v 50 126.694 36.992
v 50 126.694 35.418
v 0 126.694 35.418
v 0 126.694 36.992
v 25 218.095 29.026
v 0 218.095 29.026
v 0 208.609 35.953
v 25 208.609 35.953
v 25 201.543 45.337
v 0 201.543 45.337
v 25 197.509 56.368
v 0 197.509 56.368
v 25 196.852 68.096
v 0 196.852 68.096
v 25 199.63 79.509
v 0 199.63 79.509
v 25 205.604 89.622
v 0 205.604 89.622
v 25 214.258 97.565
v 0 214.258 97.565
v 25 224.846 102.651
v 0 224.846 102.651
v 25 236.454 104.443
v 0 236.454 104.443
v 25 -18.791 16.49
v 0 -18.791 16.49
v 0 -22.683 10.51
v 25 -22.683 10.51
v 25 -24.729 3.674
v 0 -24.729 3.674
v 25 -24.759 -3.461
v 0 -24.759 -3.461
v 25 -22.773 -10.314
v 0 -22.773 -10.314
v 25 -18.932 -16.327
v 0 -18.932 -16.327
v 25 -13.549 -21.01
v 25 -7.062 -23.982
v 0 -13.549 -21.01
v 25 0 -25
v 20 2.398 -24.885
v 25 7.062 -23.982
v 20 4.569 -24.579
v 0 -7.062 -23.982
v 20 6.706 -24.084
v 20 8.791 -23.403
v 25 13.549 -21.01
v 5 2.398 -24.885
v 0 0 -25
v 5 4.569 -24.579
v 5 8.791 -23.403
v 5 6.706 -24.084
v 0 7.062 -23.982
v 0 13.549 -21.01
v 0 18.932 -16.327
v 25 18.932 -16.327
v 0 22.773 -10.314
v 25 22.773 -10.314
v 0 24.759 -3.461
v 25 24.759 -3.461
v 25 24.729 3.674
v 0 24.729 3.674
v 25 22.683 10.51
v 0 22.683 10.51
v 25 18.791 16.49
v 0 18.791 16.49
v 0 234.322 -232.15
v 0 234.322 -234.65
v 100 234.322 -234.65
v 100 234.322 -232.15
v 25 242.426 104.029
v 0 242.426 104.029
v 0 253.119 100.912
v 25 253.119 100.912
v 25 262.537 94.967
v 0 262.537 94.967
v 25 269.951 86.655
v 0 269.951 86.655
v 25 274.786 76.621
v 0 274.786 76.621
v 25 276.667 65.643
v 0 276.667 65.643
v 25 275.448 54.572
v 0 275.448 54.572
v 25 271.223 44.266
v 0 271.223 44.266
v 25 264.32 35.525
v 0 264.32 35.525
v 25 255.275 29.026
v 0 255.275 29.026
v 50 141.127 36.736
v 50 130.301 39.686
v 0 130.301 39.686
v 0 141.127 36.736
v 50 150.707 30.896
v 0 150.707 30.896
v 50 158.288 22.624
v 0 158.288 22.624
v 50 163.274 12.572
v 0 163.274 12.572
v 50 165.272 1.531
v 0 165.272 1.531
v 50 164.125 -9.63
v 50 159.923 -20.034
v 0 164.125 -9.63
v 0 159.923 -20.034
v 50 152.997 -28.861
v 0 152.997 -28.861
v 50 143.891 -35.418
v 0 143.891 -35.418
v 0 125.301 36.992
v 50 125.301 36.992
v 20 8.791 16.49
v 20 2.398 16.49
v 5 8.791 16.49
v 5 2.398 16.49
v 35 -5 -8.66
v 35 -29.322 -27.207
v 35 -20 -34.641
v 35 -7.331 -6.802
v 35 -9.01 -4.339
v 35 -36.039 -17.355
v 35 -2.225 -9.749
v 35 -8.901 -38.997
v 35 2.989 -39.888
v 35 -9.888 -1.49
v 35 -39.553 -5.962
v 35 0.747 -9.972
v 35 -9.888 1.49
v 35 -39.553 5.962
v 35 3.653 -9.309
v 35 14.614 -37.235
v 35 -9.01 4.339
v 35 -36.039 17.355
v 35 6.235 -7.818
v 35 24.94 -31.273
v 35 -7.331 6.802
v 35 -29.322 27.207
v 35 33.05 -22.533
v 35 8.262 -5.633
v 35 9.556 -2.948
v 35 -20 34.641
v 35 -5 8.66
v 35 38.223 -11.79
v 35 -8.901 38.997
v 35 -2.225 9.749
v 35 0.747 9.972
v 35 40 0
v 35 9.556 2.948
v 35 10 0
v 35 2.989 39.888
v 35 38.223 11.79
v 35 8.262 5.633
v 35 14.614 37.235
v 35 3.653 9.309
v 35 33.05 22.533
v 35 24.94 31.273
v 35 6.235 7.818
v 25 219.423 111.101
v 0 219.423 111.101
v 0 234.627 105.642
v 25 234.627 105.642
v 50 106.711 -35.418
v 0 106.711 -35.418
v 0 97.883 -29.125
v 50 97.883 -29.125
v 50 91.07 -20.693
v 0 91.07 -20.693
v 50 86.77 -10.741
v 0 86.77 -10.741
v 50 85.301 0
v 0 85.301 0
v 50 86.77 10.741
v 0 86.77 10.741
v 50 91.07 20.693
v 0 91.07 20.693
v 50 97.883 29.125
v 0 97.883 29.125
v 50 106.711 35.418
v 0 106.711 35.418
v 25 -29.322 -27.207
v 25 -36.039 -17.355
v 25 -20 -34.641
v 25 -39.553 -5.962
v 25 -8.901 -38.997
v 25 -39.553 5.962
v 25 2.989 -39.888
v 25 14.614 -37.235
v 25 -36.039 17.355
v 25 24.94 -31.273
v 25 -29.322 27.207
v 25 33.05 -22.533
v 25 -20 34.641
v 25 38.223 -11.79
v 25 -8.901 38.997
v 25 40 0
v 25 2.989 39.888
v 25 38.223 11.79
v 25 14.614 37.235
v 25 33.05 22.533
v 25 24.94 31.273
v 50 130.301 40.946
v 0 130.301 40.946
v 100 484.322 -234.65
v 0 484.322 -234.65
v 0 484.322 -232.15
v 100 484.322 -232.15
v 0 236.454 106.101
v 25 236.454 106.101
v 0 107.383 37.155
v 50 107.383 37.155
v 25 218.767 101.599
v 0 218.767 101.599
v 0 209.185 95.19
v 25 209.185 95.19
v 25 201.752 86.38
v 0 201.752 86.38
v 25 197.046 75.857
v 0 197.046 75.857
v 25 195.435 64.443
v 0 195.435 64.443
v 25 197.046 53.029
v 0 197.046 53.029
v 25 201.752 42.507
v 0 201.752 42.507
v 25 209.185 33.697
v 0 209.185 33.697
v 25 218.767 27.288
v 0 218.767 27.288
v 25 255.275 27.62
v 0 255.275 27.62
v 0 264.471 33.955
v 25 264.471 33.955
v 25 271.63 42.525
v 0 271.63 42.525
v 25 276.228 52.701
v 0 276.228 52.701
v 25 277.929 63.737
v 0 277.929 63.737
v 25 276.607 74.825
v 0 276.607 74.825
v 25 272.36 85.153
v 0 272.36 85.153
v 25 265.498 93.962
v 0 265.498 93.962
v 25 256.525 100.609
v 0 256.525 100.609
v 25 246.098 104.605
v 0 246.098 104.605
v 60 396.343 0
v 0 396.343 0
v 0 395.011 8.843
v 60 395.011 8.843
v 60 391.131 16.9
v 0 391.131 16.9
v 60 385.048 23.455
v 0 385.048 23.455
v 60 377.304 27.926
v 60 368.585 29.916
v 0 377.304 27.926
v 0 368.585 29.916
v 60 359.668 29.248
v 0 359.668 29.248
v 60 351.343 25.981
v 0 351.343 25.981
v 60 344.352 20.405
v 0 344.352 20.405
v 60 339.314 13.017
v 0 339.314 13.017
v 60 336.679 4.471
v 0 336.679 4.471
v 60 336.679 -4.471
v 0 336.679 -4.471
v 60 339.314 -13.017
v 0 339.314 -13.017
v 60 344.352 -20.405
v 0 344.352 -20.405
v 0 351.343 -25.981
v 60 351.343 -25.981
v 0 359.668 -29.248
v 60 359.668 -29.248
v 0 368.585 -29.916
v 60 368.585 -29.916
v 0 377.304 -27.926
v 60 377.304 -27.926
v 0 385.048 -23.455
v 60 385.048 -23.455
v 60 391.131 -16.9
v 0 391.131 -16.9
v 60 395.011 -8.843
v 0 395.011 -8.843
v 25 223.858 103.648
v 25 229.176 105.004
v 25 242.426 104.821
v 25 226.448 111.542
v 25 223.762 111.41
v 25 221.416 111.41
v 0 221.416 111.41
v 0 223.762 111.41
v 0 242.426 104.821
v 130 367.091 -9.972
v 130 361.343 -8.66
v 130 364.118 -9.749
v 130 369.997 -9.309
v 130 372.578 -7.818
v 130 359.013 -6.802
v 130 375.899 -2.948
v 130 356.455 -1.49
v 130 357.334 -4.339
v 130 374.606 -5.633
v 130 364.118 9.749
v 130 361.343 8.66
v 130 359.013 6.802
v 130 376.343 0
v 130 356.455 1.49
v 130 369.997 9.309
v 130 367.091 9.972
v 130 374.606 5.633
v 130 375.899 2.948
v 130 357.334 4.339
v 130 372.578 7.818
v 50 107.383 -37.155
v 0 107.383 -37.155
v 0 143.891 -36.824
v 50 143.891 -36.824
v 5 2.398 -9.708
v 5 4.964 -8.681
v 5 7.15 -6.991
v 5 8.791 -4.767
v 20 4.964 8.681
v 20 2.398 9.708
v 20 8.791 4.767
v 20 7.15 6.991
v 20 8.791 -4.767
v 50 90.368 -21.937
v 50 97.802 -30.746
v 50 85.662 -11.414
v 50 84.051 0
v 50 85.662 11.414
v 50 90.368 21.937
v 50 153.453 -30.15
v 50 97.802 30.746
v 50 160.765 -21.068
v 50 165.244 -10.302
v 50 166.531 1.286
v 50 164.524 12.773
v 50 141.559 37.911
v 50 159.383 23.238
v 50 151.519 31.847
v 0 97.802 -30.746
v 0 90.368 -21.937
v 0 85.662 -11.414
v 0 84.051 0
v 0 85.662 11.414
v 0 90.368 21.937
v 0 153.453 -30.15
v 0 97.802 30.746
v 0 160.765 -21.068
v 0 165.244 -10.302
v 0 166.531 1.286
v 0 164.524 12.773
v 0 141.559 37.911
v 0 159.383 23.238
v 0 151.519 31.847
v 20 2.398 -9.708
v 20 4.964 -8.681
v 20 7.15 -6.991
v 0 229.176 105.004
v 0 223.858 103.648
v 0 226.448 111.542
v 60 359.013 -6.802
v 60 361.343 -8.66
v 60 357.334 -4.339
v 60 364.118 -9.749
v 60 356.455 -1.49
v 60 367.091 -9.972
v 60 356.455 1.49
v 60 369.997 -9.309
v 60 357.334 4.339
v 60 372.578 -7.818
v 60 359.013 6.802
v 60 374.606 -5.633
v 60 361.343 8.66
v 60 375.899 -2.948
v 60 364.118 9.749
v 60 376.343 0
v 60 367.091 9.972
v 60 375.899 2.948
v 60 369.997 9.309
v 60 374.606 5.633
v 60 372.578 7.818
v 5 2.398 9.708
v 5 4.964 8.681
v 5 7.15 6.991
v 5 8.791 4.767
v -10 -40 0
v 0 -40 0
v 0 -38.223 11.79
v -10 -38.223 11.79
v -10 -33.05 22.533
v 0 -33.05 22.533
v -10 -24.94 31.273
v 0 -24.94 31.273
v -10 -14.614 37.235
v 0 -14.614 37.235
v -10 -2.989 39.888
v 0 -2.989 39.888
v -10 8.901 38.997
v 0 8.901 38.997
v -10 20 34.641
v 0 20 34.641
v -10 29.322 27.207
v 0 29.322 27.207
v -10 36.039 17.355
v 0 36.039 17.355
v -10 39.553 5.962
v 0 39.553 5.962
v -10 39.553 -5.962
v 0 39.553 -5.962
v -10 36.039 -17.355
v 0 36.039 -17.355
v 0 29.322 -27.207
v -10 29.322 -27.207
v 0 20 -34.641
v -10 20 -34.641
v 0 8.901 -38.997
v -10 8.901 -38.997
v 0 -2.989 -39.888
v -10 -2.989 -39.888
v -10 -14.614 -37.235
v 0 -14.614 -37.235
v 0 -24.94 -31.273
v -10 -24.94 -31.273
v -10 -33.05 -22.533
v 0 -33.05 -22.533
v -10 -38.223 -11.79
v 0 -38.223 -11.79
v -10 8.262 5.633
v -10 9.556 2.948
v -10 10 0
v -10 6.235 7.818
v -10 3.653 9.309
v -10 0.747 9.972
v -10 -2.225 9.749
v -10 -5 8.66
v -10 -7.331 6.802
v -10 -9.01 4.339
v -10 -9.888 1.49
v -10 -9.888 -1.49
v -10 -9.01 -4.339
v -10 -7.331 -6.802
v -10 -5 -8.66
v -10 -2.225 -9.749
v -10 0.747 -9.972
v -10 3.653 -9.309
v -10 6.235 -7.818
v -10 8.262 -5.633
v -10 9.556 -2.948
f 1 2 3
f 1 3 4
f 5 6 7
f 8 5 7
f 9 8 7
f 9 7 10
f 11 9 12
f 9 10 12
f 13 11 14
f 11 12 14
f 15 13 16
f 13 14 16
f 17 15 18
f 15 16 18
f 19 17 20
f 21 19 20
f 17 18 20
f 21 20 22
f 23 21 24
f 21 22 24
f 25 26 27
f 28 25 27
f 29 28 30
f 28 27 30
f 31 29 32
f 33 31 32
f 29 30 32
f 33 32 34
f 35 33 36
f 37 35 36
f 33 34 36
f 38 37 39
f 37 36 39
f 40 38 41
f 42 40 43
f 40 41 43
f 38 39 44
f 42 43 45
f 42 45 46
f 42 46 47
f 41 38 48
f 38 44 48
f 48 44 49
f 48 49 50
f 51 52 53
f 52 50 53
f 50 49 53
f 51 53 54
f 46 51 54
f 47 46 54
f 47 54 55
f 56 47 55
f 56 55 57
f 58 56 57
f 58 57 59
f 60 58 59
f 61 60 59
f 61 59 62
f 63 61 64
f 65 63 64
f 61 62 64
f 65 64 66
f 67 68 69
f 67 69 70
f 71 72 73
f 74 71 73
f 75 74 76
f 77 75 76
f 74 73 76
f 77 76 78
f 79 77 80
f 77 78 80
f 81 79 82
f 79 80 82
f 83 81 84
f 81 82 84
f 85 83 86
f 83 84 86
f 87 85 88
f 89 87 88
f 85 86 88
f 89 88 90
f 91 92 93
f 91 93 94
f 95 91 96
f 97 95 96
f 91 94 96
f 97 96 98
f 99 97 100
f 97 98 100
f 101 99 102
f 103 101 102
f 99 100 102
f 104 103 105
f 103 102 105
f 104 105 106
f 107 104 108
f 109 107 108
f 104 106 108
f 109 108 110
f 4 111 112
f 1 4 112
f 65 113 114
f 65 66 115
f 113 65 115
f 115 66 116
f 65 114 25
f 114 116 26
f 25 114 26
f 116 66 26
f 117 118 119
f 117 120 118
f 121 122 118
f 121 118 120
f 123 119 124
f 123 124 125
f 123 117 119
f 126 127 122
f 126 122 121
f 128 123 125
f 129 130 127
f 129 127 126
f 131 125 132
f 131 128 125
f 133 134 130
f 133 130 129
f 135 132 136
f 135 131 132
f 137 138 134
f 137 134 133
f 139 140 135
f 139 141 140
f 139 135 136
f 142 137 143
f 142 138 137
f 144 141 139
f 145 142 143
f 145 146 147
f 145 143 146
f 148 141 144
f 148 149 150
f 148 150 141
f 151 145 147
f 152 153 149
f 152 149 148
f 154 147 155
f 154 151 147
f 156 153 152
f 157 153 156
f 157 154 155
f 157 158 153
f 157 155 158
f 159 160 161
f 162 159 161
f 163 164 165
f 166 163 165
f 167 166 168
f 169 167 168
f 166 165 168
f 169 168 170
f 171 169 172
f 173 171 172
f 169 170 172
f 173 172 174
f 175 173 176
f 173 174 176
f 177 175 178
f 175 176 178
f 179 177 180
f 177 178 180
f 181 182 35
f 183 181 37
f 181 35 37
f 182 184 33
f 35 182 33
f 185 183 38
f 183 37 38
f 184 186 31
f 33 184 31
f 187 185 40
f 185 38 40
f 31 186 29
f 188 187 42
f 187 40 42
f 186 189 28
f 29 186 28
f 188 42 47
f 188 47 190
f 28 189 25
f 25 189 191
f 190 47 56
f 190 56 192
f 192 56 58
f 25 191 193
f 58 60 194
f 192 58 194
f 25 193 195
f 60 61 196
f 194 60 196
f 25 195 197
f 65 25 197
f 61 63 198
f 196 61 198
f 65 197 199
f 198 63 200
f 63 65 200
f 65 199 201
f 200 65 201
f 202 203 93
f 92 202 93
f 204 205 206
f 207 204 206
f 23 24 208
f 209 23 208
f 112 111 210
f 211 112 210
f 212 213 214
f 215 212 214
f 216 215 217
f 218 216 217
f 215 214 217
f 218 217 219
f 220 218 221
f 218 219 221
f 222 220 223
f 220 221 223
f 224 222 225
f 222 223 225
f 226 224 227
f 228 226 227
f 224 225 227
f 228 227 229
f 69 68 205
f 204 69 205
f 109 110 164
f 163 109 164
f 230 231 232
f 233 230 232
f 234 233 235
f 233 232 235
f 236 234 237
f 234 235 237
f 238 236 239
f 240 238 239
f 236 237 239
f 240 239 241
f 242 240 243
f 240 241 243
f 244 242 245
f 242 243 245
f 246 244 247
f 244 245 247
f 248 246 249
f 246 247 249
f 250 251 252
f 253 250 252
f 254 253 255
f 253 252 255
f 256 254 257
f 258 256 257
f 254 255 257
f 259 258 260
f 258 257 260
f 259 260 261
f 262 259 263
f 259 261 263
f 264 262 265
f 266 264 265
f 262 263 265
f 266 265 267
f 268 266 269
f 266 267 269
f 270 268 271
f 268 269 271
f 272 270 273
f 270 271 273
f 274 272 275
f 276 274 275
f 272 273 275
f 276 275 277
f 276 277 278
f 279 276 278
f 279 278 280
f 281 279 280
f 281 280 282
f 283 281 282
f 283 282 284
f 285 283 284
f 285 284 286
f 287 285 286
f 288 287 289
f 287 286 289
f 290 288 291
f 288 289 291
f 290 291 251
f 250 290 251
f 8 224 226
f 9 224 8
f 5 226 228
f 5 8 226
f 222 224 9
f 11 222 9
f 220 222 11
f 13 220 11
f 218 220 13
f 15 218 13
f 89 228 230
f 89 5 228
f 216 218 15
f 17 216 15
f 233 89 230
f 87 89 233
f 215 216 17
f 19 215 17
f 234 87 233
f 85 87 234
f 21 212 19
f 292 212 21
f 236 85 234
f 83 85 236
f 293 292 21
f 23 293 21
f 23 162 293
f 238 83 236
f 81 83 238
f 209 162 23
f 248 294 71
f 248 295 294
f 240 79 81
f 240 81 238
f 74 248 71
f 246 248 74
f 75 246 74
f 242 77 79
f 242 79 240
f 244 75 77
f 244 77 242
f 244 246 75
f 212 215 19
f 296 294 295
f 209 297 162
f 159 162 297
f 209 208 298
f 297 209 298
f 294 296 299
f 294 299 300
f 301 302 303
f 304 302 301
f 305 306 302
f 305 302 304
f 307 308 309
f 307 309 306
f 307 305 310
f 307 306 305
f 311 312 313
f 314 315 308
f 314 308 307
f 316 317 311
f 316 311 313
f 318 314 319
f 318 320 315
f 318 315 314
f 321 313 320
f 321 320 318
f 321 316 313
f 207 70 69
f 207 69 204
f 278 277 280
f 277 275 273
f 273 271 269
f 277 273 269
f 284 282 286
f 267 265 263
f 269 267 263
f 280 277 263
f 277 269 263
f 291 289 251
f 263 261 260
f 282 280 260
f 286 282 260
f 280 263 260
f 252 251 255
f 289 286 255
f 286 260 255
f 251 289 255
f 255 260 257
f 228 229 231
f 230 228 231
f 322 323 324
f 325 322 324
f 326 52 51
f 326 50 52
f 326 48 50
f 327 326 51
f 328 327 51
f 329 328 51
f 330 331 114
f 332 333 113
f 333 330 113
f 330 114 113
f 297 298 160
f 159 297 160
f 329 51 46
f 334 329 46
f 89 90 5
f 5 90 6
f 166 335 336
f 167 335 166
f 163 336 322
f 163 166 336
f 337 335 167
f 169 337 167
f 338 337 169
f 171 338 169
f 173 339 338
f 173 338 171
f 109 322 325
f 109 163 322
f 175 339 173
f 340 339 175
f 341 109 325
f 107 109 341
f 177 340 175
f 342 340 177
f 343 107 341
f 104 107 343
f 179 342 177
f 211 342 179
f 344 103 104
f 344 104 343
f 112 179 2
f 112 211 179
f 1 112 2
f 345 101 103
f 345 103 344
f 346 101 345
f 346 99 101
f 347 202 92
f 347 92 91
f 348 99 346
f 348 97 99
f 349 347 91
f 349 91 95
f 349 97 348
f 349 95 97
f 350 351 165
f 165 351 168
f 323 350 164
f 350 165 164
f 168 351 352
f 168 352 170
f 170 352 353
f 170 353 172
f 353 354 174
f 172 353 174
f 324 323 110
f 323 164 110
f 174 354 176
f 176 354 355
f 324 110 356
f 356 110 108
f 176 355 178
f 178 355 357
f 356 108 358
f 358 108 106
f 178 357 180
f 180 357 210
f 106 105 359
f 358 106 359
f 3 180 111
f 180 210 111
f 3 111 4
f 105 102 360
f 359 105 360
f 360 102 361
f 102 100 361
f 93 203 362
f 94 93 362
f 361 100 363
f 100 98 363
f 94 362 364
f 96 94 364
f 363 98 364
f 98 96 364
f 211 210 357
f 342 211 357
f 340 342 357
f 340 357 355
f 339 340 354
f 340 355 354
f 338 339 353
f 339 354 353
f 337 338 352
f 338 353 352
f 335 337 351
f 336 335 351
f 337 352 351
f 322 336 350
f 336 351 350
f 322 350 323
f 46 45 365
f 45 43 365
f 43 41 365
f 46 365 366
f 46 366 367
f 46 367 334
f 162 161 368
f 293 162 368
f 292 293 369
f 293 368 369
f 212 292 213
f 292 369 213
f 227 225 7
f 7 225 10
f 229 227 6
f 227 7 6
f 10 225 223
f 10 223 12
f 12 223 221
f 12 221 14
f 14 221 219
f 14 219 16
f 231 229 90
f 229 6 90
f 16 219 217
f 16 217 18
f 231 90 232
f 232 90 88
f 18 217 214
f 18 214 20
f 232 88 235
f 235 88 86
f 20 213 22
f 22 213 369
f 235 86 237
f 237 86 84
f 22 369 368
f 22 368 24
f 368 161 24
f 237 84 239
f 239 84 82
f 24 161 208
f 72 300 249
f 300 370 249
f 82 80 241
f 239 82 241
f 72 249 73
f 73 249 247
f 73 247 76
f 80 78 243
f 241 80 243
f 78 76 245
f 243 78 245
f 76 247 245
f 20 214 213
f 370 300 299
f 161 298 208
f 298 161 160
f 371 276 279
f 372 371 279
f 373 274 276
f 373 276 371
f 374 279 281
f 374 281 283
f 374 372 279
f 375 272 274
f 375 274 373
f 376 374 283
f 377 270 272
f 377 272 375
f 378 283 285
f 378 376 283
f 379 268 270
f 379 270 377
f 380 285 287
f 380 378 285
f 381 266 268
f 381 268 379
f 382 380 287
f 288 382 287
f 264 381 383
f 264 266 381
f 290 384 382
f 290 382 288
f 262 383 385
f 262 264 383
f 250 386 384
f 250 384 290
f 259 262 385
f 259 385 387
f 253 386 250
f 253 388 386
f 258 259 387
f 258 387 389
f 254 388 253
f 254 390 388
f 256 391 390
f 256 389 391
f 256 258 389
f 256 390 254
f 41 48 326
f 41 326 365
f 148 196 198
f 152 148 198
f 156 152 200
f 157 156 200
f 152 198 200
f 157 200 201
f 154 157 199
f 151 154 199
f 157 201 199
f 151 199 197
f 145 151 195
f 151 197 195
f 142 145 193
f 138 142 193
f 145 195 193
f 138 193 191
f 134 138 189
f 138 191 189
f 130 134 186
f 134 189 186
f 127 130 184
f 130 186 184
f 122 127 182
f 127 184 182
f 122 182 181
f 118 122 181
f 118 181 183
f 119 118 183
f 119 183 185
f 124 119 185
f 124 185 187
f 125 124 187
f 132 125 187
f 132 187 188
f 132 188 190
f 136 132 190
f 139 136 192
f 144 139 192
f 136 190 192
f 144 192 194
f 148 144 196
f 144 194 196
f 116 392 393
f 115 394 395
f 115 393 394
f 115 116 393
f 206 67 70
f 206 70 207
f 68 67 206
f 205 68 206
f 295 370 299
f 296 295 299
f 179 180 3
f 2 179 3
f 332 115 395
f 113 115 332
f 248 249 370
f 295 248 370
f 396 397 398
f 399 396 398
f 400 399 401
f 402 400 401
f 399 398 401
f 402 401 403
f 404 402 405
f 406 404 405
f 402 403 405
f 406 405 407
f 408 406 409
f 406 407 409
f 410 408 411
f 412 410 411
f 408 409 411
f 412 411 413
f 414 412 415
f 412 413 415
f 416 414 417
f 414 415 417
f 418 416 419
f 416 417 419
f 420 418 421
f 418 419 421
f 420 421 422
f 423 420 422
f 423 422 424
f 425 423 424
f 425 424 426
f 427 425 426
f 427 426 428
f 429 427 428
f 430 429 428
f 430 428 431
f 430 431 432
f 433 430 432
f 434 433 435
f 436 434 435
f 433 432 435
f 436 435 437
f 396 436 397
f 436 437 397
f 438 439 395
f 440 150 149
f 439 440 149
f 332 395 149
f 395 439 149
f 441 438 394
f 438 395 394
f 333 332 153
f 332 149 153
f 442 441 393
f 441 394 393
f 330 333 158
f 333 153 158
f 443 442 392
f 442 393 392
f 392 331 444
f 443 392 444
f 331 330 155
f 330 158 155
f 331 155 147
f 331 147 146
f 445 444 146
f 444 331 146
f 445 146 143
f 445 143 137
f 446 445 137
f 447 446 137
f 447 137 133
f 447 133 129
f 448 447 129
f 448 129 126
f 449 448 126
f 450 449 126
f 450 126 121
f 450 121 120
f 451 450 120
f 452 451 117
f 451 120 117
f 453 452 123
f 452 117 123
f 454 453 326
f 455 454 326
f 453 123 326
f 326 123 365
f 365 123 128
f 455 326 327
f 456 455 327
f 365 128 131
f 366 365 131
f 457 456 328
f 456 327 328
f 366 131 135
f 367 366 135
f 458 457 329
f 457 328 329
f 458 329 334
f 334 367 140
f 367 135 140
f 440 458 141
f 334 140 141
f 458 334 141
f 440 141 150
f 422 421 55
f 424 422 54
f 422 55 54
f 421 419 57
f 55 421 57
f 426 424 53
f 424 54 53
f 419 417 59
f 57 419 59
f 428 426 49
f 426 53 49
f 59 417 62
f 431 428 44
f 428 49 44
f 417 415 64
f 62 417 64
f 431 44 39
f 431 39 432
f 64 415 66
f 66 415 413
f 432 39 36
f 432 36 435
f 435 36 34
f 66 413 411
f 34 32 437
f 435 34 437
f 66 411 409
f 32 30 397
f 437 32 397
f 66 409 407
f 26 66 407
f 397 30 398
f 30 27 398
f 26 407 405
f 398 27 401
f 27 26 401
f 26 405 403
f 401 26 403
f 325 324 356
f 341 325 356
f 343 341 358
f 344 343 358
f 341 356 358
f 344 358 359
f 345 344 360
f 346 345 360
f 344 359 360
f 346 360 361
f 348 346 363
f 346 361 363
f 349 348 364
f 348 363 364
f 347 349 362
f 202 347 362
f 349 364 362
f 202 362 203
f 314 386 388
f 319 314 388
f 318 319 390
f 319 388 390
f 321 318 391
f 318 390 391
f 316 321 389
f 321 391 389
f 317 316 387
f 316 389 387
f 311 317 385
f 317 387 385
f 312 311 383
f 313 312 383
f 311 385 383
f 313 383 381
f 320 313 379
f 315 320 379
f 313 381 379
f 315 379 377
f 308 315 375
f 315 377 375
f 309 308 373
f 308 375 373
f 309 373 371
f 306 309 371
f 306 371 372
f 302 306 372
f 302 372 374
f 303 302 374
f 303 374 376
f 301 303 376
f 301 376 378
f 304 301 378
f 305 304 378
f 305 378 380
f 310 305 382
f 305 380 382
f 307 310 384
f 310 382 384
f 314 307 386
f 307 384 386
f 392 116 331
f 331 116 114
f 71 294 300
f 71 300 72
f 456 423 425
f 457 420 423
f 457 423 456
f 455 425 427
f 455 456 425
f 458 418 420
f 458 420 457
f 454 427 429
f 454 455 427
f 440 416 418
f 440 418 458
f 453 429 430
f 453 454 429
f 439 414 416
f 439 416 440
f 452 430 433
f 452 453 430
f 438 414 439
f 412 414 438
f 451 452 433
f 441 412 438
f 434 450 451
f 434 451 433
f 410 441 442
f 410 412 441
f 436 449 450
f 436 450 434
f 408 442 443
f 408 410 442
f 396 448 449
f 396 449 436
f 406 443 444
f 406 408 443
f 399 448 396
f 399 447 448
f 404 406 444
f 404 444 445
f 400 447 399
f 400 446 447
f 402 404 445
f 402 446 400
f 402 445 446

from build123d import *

# Parameters (mm, degrees)
F1_DEPTH  = 25
F2_R      = 40
F3_DEPTH  = 10
F4_R      = 40
F5_DEPTH  = 10
F6_W      = 15
F6_H      = 6.3930185955
F7_DEPTH  = 41.375401655
F8_DEPTH  = 50
F9_R      = 10
F10_DEPTH = 45
F0_R      = 30
F11_DEPTH = 60
F12_R     = 10
F13_DEPTH = 70
F0_W      = 250
F0_H      = 2.5
F14_DEPTH = 100
F15_DEPTH = 5
F16_DEPTH = 25


with BuildPart() as f1:
    # F0 (on Right) → F1 (new body)
    with BuildSketch(Plane.YZ):
        with BuildLine():
            Line((18.7907296371, 16.4896476526), (-18.7907296371, 16.4896476526))
            ThreePointArc((-18.7907296371, 16.4896476526), (0, -25), (18.7907296371, 16.4896476526))
        make_face()
    extrude(amount=F1_DEPTH)

    # F2 (on face) → F3 (join)
    with BuildSketch(Plane.YZ.offset(25)):
        Circle(F2_R)
        with BuildLine():
            Line((-18.7907296371, 16.4896476526), (18.7907296371, 16.4896476526))
            ThreePointArc((18.7907296371, 16.4896476526), (0, -25), (-18.7907296371, 16.4896476526))
        make_face(mode=Mode.SUBTRACT)
        with BuildLine():
            ThreePointArc((-18.7907296371, 16.4896476526), (0, -25), (18.7907296371, 16.4896476526))
            Line((18.7907296371, 16.4896476526), (-18.7907296371, 16.4896476526))
        make_face()
    extrude(amount=F3_DEPTH)

    # F4 (on face) → F5 (join)
    with BuildSketch(Plane(origin=(0, 0, 0), x_dir=(0, -1, 0), z_dir=(-1, 0, 0))):
        Circle(F4_R)
        with BuildLine():
            Line((-18.7907296371, 16.4896476526), (18.7907296371, 16.4896476526))
            ThreePointArc((18.7907296371, 16.4896476526), (0, -25), (-18.7907296371, 16.4896476526))
        make_face(mode=Mode.SUBTRACT)
        with BuildLine():
            ThreePointArc((-18.7907296371, 16.4896476526), (0, -25), (18.7907296371, 16.4896476526))
            Line((18.7907296371, 16.4896476526), (-18.7907296371, 16.4896476526))
        make_face()
    extrude(amount=F5_DEPTH)

    # F6 (on face) → F7 (cut, through all)
    with BuildSketch(Plane.XY.offset(16.4896476526)):
        with Locations((12.5, 5.5942203393)):
            Rectangle(F6_W, F6_H)
    extrude(amount=-F7_DEPTH, mode=Mode.SUBTRACT)

    # F9 (on face) → F10 (cut, through all)
    with BuildSketch(Plane.YZ.offset(35)):
        Circle(F9_R)
    extrude(amount=-F10_DEPTH, mode=Mode.SUBTRACT)


with BuildPart() as f8:
    # F0 (on Right) → F8 (new body)
    with BuildSketch(Plane.YZ):
        with BuildLine():
            Line((125.3012120724, 36.9923449587), (107.3829577751, 37.1550624133))
            ThreePointArc((107.3829577751, 37.1550624133), (84.0512120724, 0), (107.3829577751, -37.1550624133))
            Line((107.3829577751, -37.1550624133), (143.8912733171, -36.8235267583))
            ThreePointArc((143.8912733171, -36.8235267583), (165.4293379866, 9.5548945892), (125.3012120724, 41.25))
            Line((125.3012120724, 41.25), (125.3012120724, 36.9923449587))
        make_face()
        with BuildLine():
            ThreePointArc((106.7111508276, -35.4176456433), (85.3012120724, 0), (106.7111508276, 35.4176456433))
            Line((106.7111508276, 35.4176456433), (126.6936709107, 35.4176456433))
            Line((126.6936709107, 35.4176456433), (126.6936709107, 39.9757558826))
            ThreePointArc((126.6936709107, 39.9757558826), (164.2995008249, 8.8956997685), (143.8912733171, -35.4176456433))
            Line((143.8912733171, -35.4176456433), (106.7111508276, -35.4176456433))
        make_face(mode=Mode.SUBTRACT)
    extrude(amount=F8_DEPTH)

    # F15 (cut): a face of the model
    f15_faces = [f8.faces().sort_by_distance(p)[0] for p in [
        (25, 125.3012120724, 39.1211724794),
    ]]
    extrude(f15_faces, amount=-F15_DEPTH, mode=Mode.SUBTRACT)


with BuildPart() as f11:
    # F0 (on Right) → F11 (new body)
    with BuildSketch(Plane.YZ):
        with Locations((366.3434386253, 0)):
            Circle(F0_R)
    extrude(amount=F11_DEPTH)

    # F12 (on face) → F13 (join)
    with BuildSketch(Plane.YZ.offset(60)):
        with Locations((366.3434386253, 0)):
            Circle(F12_R)
    extrude(amount=F13_DEPTH)


with BuildPart() as f14:
    # F0 (on Right) → F14 (new body)
    with BuildSketch(Plane.YZ):
        with Locations((359.3224585056, -233.4000903368)):
            Rectangle(F0_W, F0_H)
    extrude(amount=F14_DEPTH)


with BuildPart() as f16:
    # F0 (on Right) → F16 (new body)
    with BuildSketch(Plane.YZ):
        with BuildLine():
            ThreePointArc((234.6268562596, 105.6420740218), (226.4942262259, 104.4148265861), (218.7667309573, 101.5985126105))
            ThreePointArc((218.7667309573, 101.5985126105), (195.4349852545, 64.4434501972), (218.7667309573, 27.2883877839))
            Line((218.7667309573, 27.2883877839), (255.2750464993, 27.6199234389))
            ThreePointArc((255.2750464993, 27.6199234389), (277.6449726535, 69.3262703123), (246.0976726998, 104.6051709653))
            Line((246.0976726998, 104.6051709653), (226.4478235442, 111.5422657757))
            Line((226.4478235442, 111.5422657757), (223.7624526024, 111.4095747471))
            Line((223.7624526024, 111.4095747471), (242.4257096136, 104.8207820123))
            Line((242.4257096136, 104.8207820123), (242.4257096136, 104.0293578391))
            ThreePointArc((242.4257096136, 104.0293578391), (276.1106118618, 71.1977056427), (255.2750464993, 29.0258045539))
            Line((255.2750464993, 29.0258045539), (218.0949240098, 29.0258045539))
            ThreePointArc((218.0949240098, 29.0258045539), (197.8200284979, 73.904694106), (236.4543539259, 104.4427853066))
            Line((236.4543539259, 104.4427853066), (236.4543539259, 106.1006423954))
            Line((236.4543539259, 106.1006423954), (221.4163988829, 111.4095747471))
            Line((221.4163988829, 111.4095747471), (219.422552045, 111.1006011765))
            Line((219.422552045, 111.1006011765), (234.6268562596, 105.6420740218))
        make_face()
    extrude(amount=F16_DEPTH)


solid = Compound([f1.part, f8.part, f11.part, f14.part, f16.part])
